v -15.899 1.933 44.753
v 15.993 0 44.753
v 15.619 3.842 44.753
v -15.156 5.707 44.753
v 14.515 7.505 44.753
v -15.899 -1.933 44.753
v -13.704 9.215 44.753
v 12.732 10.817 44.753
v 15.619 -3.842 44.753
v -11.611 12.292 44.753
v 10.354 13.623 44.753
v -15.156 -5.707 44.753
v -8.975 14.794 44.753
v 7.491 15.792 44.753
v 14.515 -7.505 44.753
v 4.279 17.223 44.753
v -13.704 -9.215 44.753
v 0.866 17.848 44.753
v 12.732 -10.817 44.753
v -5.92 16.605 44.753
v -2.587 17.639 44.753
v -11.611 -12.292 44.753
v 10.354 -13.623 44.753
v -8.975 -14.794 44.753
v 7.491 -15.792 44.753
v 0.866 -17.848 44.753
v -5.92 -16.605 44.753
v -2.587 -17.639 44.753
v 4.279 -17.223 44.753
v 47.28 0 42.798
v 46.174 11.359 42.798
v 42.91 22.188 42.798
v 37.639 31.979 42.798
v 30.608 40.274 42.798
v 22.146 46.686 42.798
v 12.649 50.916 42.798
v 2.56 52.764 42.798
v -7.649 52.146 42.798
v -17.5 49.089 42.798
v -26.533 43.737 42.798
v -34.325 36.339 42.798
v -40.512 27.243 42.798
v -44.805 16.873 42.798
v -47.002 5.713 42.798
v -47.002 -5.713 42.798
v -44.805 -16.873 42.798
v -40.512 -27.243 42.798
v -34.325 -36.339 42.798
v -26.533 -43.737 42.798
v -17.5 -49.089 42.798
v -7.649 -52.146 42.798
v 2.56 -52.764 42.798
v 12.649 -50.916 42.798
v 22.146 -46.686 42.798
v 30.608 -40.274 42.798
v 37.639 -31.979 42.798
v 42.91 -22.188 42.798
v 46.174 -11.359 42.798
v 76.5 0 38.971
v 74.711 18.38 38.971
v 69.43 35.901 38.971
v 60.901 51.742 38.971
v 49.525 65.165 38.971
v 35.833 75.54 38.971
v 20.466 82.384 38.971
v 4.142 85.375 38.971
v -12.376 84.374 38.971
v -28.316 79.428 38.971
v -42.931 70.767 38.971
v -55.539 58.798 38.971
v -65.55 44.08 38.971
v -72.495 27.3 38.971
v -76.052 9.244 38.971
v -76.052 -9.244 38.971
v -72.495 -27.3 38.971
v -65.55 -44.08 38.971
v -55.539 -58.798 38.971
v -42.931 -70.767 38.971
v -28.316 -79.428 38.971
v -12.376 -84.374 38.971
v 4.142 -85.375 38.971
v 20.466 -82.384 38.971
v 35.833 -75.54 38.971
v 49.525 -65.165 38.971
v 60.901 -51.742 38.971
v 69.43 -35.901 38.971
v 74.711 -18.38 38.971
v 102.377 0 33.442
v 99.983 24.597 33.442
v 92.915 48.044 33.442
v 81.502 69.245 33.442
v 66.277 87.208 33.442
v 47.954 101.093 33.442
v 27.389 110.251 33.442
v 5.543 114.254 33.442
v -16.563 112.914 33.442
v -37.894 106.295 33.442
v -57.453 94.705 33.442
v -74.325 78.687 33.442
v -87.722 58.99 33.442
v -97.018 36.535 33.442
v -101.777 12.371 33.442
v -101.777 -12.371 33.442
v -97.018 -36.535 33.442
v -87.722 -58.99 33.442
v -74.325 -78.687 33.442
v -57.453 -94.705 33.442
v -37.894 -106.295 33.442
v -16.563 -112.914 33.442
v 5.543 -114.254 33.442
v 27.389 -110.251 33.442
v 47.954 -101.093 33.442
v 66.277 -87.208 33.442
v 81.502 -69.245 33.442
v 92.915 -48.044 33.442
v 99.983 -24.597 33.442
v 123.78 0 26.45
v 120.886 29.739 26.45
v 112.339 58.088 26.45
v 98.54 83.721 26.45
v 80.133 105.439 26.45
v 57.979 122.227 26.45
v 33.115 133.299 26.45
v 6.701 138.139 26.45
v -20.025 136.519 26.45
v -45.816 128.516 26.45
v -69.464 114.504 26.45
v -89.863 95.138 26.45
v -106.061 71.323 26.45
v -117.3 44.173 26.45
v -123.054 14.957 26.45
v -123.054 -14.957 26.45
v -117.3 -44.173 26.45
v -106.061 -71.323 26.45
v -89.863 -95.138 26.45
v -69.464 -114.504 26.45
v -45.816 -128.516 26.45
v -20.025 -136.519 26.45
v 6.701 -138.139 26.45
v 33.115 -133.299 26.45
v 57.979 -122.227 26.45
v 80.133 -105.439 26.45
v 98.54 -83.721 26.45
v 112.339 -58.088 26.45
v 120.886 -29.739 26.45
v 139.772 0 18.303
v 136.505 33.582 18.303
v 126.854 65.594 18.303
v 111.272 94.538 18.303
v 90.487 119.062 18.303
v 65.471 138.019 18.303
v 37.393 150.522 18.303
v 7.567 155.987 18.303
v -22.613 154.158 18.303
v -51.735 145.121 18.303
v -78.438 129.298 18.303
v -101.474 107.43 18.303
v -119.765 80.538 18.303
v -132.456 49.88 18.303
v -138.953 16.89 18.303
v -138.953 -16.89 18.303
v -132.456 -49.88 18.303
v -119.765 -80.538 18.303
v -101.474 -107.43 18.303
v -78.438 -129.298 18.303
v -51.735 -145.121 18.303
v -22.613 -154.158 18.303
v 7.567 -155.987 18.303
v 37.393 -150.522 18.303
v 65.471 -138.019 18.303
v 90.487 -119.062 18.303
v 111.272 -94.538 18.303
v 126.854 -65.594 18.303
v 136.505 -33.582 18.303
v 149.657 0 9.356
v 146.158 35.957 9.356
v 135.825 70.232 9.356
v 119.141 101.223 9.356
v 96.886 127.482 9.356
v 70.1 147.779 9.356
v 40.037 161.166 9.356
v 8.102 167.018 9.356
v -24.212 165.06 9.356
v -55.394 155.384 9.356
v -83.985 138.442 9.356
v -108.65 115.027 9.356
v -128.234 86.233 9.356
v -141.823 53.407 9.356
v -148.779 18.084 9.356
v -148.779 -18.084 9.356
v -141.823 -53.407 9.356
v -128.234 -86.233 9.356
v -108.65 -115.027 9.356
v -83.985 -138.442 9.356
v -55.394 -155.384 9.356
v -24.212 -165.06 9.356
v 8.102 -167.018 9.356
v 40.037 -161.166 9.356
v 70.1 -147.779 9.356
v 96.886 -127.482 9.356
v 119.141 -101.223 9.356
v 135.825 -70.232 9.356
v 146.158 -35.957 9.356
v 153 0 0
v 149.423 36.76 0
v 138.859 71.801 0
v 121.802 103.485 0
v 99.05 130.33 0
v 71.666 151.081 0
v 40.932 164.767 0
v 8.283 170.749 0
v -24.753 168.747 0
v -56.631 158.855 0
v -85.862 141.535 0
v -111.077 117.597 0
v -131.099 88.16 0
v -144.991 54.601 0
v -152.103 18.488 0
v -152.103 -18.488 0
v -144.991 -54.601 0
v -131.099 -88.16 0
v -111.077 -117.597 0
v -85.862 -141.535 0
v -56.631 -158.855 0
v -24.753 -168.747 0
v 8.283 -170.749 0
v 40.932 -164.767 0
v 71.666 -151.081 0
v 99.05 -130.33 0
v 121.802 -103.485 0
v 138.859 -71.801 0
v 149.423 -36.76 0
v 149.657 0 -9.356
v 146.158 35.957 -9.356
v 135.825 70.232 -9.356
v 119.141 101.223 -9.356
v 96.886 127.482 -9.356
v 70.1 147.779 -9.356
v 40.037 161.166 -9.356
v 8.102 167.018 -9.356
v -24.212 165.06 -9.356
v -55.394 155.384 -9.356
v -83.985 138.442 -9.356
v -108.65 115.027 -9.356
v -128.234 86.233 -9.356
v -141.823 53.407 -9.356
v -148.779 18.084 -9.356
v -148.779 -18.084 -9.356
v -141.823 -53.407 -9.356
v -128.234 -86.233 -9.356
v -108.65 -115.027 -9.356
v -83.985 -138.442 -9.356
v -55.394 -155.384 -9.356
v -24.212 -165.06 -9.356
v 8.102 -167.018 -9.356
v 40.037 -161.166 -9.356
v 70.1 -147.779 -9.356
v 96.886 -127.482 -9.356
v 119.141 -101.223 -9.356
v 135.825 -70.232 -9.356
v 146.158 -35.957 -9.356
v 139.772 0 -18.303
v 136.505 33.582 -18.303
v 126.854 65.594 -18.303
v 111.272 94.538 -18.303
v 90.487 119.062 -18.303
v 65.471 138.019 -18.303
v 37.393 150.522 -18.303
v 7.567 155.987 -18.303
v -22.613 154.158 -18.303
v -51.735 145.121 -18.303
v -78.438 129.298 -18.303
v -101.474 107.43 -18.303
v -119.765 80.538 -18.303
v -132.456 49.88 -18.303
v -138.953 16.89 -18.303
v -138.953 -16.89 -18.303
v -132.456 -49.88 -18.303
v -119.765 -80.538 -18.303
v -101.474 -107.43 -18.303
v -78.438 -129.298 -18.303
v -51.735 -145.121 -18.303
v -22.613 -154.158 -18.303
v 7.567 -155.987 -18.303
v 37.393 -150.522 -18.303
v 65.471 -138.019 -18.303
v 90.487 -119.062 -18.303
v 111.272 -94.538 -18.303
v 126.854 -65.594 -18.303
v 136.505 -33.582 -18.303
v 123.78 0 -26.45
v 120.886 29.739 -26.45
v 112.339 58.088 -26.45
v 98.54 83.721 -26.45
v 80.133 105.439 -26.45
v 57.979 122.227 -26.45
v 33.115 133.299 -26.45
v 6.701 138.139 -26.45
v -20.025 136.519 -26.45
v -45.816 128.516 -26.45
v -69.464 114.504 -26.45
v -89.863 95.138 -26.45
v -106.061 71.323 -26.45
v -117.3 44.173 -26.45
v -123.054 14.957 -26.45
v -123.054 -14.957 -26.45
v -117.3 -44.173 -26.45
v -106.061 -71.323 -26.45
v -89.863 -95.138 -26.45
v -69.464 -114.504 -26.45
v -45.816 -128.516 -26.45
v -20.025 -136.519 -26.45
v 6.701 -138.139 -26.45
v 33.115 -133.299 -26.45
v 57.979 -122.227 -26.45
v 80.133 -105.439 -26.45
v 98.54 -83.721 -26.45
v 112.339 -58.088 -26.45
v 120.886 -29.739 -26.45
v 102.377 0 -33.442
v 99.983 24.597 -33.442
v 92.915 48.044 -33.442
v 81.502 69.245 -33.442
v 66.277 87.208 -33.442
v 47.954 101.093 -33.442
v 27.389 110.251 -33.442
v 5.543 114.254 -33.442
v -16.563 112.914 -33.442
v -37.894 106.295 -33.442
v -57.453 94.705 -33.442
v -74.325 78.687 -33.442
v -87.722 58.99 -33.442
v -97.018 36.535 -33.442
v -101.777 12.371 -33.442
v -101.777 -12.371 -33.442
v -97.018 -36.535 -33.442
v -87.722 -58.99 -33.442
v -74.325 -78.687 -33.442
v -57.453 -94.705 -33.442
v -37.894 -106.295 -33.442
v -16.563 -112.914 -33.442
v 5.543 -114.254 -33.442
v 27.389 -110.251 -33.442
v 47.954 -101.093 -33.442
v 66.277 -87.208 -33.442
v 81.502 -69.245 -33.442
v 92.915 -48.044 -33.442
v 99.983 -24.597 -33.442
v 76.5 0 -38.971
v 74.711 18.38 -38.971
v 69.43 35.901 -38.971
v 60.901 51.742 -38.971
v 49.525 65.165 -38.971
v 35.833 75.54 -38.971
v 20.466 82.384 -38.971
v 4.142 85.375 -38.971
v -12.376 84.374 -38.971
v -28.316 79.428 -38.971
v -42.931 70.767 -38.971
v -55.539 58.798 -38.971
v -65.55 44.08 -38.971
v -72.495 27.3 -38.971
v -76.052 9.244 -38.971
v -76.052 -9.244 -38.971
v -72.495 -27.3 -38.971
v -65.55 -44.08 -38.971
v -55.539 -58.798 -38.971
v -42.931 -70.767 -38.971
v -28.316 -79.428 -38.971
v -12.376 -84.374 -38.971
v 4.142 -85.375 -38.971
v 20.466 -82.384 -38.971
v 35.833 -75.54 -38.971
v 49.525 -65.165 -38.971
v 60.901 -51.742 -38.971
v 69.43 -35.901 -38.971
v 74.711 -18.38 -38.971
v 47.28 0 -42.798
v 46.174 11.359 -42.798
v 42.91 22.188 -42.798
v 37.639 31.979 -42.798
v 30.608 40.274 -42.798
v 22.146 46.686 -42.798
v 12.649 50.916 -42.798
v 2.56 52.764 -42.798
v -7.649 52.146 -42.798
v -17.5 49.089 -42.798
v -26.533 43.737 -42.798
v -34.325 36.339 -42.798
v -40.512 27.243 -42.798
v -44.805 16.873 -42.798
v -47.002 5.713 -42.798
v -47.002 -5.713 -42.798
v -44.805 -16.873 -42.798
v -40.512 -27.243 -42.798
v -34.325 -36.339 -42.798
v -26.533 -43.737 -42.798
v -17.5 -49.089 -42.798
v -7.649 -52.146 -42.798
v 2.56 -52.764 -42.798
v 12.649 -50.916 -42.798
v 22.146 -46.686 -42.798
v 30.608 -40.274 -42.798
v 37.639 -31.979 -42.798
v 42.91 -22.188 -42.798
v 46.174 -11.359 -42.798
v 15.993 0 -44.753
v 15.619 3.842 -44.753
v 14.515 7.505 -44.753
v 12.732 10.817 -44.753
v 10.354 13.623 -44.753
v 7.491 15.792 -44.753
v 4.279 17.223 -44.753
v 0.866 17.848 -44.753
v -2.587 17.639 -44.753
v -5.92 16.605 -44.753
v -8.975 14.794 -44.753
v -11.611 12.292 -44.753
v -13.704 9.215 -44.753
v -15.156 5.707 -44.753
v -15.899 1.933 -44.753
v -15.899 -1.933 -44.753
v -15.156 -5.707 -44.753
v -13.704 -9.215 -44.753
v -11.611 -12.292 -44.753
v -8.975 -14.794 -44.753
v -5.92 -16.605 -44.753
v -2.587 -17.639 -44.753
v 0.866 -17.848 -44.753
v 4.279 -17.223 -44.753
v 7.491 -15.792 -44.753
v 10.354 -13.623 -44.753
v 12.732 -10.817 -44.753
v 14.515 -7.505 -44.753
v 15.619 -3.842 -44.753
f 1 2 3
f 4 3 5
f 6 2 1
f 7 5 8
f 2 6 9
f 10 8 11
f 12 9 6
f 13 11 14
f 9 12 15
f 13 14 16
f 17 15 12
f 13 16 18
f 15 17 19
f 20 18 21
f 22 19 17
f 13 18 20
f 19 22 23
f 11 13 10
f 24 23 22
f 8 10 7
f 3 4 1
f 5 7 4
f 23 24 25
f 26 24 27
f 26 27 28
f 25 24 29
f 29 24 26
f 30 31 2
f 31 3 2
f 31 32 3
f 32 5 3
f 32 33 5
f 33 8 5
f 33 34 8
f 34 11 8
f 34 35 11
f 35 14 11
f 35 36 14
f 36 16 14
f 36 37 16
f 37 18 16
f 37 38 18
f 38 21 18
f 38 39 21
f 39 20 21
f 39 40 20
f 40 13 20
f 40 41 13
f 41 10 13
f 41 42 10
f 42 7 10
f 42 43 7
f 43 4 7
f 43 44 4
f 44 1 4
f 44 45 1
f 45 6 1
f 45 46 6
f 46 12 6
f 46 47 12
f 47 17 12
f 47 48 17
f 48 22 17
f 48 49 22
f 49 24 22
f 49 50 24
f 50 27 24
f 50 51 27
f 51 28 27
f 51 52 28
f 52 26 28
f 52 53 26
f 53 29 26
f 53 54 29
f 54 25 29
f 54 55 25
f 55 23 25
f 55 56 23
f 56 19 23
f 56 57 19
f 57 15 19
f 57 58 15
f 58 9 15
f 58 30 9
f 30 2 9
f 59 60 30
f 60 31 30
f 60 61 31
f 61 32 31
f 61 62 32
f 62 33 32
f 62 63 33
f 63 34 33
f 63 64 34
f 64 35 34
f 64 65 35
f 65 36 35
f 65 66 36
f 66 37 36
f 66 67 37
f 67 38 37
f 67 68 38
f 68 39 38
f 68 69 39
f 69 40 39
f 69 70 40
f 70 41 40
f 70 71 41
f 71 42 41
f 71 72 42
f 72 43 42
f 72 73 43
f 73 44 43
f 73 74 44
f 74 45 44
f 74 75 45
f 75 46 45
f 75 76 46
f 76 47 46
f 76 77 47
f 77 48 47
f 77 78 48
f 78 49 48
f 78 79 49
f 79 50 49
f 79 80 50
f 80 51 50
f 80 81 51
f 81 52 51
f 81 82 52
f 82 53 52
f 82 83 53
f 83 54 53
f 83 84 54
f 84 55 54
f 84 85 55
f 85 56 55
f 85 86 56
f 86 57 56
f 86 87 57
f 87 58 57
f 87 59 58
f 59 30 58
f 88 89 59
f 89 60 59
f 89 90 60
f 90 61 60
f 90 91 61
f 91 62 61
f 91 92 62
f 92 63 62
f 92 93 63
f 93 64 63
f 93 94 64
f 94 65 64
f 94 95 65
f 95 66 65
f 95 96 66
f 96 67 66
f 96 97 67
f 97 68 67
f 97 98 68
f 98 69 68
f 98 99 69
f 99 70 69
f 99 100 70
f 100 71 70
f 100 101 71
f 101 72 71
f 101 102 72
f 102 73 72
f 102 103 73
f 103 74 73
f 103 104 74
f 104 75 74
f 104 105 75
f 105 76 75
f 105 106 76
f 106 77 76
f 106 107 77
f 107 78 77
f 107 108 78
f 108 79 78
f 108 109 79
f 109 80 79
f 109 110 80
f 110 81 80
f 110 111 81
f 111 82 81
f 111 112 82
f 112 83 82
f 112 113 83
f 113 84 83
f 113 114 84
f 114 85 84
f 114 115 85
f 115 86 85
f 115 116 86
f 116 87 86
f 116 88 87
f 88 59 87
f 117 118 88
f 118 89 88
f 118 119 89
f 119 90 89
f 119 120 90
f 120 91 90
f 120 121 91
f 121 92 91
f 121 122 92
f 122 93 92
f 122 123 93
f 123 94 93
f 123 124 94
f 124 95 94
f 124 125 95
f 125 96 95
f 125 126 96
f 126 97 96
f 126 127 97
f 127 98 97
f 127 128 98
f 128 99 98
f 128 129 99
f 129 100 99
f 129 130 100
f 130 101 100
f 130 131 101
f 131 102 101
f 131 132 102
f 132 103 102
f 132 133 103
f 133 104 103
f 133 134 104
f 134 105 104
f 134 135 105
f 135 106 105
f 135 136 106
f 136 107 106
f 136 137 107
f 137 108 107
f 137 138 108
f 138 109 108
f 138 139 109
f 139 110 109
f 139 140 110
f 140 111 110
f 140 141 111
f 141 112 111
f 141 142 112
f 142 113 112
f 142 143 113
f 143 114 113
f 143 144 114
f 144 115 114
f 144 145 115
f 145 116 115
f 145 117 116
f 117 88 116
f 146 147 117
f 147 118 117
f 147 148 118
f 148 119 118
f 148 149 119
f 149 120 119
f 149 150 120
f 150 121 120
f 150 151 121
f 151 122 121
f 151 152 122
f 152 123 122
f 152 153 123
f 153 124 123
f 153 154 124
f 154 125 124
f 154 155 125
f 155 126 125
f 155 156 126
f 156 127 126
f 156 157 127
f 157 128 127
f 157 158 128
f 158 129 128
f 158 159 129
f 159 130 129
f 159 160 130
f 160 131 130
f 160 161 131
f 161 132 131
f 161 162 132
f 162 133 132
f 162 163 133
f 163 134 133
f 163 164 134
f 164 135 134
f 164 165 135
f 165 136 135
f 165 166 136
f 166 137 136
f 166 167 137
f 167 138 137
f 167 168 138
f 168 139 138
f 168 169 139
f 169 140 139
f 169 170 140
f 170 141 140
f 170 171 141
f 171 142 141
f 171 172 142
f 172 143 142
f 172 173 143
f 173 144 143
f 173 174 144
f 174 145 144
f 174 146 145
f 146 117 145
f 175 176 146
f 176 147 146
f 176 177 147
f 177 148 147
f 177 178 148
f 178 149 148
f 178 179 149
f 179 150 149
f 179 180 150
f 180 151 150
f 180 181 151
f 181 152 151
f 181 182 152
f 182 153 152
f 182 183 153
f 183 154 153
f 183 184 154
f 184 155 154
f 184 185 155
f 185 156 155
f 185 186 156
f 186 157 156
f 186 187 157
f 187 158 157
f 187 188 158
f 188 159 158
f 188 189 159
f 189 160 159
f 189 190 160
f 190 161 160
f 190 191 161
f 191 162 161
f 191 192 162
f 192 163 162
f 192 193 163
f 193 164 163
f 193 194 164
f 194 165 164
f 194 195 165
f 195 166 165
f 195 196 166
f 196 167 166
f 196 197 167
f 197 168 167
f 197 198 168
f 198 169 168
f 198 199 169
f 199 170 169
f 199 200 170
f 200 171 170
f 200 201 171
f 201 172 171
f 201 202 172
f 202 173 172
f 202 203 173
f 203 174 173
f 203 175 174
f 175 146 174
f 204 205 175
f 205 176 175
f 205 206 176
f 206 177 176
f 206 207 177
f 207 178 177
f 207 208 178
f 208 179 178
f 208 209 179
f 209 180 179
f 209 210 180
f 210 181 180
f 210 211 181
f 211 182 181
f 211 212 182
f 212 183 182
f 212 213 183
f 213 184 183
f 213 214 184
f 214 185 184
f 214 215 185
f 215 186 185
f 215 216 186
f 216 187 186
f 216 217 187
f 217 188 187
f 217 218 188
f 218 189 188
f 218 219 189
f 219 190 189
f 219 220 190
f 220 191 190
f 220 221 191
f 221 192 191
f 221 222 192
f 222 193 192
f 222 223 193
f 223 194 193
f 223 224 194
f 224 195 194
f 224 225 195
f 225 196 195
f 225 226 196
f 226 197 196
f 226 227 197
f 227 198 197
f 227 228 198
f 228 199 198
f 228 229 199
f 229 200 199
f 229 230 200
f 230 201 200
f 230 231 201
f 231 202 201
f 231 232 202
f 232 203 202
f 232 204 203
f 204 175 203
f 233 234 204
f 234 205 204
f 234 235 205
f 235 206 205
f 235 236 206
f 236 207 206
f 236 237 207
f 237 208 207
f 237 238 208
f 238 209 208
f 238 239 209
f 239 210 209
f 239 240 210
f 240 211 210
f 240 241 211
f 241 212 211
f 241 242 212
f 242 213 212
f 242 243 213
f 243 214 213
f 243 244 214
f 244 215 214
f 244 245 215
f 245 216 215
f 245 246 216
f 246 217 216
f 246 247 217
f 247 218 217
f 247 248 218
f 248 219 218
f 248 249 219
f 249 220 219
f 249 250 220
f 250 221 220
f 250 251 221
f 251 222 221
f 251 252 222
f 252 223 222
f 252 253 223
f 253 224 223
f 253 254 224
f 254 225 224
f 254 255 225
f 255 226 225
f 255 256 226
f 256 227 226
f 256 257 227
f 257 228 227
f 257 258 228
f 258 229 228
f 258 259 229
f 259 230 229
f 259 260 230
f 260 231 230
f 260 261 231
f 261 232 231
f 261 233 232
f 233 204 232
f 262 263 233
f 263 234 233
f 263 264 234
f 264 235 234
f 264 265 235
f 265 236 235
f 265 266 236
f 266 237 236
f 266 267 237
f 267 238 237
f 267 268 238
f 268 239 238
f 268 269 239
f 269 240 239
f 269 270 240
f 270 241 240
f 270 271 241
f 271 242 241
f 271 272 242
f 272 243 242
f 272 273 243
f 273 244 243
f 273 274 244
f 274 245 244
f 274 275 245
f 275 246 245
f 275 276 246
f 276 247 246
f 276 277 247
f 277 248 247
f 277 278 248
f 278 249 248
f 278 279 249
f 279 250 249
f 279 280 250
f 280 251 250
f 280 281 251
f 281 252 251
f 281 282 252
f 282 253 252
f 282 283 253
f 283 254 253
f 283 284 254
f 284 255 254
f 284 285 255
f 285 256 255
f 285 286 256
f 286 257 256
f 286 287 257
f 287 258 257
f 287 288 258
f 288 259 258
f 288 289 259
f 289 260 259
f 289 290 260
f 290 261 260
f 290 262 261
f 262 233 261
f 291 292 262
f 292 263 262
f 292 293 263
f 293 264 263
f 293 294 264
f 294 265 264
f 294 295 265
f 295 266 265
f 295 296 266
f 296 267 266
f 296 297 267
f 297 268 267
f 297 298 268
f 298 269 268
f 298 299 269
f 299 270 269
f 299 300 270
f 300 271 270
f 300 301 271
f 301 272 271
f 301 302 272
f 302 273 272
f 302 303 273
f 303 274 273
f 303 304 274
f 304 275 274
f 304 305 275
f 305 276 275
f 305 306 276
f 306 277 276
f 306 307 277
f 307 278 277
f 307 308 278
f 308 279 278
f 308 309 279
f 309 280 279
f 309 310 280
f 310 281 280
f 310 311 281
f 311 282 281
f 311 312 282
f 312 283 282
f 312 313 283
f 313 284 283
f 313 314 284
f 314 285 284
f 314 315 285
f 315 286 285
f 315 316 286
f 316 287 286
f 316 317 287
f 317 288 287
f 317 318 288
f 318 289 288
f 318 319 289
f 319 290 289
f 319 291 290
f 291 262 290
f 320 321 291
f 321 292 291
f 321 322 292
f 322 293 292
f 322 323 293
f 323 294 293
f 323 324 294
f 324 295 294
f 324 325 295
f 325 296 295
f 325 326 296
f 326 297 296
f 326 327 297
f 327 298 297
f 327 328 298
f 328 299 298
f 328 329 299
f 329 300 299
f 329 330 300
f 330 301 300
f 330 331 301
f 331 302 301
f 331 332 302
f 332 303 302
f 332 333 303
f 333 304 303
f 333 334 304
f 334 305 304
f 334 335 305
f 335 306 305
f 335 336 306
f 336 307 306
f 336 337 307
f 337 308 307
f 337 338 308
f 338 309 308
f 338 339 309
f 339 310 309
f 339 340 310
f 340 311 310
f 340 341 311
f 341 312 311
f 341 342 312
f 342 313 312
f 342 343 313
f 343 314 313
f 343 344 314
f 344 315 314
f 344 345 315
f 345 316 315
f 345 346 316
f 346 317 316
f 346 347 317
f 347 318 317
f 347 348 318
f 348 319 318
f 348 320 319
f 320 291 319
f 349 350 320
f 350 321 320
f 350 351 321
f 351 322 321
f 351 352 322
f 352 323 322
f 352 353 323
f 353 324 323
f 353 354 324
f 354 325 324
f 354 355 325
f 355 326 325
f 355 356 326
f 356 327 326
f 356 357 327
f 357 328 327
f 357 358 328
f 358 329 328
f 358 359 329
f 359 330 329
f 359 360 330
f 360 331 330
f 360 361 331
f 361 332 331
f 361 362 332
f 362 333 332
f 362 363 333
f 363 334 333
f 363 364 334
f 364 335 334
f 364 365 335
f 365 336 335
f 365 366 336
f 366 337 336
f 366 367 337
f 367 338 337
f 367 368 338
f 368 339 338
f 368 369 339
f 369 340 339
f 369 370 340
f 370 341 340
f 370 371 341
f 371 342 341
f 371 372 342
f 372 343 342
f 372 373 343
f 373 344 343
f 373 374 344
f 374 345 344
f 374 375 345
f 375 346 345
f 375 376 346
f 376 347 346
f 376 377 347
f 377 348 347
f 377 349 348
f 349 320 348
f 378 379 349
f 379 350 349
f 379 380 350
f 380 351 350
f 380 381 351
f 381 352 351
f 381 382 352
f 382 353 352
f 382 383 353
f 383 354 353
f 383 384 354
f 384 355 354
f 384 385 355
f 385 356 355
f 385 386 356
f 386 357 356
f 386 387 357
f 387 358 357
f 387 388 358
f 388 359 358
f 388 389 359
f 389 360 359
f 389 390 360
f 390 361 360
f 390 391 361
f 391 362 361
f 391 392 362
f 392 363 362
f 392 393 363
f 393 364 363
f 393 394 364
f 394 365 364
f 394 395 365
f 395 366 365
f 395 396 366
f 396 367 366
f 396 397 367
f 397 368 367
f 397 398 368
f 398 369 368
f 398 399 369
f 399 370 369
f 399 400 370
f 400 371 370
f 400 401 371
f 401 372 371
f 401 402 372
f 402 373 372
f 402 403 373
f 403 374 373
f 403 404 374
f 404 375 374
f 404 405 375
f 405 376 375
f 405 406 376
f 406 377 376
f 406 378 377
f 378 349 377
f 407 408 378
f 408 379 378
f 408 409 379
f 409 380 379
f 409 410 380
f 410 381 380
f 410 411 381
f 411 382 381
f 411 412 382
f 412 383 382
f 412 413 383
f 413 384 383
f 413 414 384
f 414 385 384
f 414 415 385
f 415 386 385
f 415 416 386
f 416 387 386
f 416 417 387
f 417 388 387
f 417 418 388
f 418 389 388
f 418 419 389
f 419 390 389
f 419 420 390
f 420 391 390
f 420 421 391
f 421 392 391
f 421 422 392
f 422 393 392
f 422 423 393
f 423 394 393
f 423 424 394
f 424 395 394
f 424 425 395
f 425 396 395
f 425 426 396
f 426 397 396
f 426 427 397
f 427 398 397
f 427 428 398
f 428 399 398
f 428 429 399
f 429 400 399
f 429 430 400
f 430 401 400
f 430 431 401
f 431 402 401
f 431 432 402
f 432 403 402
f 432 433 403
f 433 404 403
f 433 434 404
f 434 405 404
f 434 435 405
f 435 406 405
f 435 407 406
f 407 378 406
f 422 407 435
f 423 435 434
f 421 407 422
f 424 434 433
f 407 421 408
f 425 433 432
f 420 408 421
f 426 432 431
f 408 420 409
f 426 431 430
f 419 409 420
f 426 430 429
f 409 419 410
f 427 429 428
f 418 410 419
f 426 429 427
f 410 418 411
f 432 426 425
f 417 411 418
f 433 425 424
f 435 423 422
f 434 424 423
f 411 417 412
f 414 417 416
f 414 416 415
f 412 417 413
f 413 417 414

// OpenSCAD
// Generated by SolidPython 1.0.1 on 2020-07-29 00:46:53


scale(v = [17, 19, 5]) {
	sphere(r = 9);
}
/***********************************************
*********      SolidPython code:      **********
************************************************
 
# import packages: SolidPython
from solid import *
from solid.utils import *
from itertools import chain, combinations, permutations


class Resize:

    def __init__(self, scad_file):
        self.scad_file = scad_file
        #self.scad_file = import_scad(scad_file)
        # cone/cylinder param:
        self.r1 = 0
        self.r2 = 0
        self.h = 0
        # rectangular prism param:
        self.w = 0
        self.l = 0
        # ellipse param:
        self.r = 0

    # import OpenScad code (file name corresponds to shape)


    # classify shape + parameters
    def assign(self, param1, param2, param3):
        if self.scad_file == 'cone.scad':
            self.r1 = param1
            self.r2 = param2
            self.h = param3
        elif self.scad_file == 'cylinder.scad':
            self.r1 = param1
            self.r2 = param2
            self.h = param3
        elif self.scad_file == 'rectangularPrism.scad':
            self.h = param1
            self.l = param2
            self.w = param3
        else:
            self.r = param1
            self.h = param2

    # resize parameters
    def iterate(self):
        x = range(3, 20, 2)
        i = 1
        if self.scad_file == 'cone.scad':
            tempList = list(permutations(x, 2))
            for temp in tempList:
                param1 = temp[0]
                param2 = temp[1]
                filepath = 'produced_scad_files/' + 'cone' + str(param1) + '_' + str(param2) + '_' + '.scad'
                scad_render_to_file(cylinder(h=param1, r1=param2, r2=0), filepath)

        elif self.scad_file == 'cylinder.scad':
            tempList = list(permutations(x, 3))
            for temp in tempList:
                param1 = temp[0]
                param2 = temp[1]
                filepath = 'produced_scad_files/' + 'cylinder' + str(param1) + '_' + str(param2) + '_' + '.scad'
                scad_render_to_file(cylinder(h=param1, r1=param2, r2=param2), filepath)

        elif self.scad_file == 'rectangularPrism.scad':
            tempList = list(permutations(x, 3))
            for temp in tempList:
                param1 = temp[0]
                param2 = temp[1]
                param3 = temp[2]
                filepath = 'produced_scad_files/' + 'rectangularPrism' + str(param1) + '_' + str(param2) + '_' + str(
                    param3) + '.scad'
                scad_render_to_file(cube(size=(param1, param2, param3)), filepath)

        elif self.scad_file == 'ellipse.scad':
            tempList = list(permutations(x, 4))
            for temp in tempList:
                param1 = temp[0]
                param2 = temp[1]
                param3 = temp[2]
                param4 = temp[3]
                filepath = 'produced_scad_files/' + 'ellipse' + str(param1) + '_' + str(param2) + '_' + str(param3) + '_' + str(param4) + '.scad'
                scad_render_to_file(scale([param1, param2, param3])(sphere(r=param4)), filepath)

    def render_to_scadfile(self):
        scad_render_to_file(scad, 'example.scad') 
 
************************************************/
